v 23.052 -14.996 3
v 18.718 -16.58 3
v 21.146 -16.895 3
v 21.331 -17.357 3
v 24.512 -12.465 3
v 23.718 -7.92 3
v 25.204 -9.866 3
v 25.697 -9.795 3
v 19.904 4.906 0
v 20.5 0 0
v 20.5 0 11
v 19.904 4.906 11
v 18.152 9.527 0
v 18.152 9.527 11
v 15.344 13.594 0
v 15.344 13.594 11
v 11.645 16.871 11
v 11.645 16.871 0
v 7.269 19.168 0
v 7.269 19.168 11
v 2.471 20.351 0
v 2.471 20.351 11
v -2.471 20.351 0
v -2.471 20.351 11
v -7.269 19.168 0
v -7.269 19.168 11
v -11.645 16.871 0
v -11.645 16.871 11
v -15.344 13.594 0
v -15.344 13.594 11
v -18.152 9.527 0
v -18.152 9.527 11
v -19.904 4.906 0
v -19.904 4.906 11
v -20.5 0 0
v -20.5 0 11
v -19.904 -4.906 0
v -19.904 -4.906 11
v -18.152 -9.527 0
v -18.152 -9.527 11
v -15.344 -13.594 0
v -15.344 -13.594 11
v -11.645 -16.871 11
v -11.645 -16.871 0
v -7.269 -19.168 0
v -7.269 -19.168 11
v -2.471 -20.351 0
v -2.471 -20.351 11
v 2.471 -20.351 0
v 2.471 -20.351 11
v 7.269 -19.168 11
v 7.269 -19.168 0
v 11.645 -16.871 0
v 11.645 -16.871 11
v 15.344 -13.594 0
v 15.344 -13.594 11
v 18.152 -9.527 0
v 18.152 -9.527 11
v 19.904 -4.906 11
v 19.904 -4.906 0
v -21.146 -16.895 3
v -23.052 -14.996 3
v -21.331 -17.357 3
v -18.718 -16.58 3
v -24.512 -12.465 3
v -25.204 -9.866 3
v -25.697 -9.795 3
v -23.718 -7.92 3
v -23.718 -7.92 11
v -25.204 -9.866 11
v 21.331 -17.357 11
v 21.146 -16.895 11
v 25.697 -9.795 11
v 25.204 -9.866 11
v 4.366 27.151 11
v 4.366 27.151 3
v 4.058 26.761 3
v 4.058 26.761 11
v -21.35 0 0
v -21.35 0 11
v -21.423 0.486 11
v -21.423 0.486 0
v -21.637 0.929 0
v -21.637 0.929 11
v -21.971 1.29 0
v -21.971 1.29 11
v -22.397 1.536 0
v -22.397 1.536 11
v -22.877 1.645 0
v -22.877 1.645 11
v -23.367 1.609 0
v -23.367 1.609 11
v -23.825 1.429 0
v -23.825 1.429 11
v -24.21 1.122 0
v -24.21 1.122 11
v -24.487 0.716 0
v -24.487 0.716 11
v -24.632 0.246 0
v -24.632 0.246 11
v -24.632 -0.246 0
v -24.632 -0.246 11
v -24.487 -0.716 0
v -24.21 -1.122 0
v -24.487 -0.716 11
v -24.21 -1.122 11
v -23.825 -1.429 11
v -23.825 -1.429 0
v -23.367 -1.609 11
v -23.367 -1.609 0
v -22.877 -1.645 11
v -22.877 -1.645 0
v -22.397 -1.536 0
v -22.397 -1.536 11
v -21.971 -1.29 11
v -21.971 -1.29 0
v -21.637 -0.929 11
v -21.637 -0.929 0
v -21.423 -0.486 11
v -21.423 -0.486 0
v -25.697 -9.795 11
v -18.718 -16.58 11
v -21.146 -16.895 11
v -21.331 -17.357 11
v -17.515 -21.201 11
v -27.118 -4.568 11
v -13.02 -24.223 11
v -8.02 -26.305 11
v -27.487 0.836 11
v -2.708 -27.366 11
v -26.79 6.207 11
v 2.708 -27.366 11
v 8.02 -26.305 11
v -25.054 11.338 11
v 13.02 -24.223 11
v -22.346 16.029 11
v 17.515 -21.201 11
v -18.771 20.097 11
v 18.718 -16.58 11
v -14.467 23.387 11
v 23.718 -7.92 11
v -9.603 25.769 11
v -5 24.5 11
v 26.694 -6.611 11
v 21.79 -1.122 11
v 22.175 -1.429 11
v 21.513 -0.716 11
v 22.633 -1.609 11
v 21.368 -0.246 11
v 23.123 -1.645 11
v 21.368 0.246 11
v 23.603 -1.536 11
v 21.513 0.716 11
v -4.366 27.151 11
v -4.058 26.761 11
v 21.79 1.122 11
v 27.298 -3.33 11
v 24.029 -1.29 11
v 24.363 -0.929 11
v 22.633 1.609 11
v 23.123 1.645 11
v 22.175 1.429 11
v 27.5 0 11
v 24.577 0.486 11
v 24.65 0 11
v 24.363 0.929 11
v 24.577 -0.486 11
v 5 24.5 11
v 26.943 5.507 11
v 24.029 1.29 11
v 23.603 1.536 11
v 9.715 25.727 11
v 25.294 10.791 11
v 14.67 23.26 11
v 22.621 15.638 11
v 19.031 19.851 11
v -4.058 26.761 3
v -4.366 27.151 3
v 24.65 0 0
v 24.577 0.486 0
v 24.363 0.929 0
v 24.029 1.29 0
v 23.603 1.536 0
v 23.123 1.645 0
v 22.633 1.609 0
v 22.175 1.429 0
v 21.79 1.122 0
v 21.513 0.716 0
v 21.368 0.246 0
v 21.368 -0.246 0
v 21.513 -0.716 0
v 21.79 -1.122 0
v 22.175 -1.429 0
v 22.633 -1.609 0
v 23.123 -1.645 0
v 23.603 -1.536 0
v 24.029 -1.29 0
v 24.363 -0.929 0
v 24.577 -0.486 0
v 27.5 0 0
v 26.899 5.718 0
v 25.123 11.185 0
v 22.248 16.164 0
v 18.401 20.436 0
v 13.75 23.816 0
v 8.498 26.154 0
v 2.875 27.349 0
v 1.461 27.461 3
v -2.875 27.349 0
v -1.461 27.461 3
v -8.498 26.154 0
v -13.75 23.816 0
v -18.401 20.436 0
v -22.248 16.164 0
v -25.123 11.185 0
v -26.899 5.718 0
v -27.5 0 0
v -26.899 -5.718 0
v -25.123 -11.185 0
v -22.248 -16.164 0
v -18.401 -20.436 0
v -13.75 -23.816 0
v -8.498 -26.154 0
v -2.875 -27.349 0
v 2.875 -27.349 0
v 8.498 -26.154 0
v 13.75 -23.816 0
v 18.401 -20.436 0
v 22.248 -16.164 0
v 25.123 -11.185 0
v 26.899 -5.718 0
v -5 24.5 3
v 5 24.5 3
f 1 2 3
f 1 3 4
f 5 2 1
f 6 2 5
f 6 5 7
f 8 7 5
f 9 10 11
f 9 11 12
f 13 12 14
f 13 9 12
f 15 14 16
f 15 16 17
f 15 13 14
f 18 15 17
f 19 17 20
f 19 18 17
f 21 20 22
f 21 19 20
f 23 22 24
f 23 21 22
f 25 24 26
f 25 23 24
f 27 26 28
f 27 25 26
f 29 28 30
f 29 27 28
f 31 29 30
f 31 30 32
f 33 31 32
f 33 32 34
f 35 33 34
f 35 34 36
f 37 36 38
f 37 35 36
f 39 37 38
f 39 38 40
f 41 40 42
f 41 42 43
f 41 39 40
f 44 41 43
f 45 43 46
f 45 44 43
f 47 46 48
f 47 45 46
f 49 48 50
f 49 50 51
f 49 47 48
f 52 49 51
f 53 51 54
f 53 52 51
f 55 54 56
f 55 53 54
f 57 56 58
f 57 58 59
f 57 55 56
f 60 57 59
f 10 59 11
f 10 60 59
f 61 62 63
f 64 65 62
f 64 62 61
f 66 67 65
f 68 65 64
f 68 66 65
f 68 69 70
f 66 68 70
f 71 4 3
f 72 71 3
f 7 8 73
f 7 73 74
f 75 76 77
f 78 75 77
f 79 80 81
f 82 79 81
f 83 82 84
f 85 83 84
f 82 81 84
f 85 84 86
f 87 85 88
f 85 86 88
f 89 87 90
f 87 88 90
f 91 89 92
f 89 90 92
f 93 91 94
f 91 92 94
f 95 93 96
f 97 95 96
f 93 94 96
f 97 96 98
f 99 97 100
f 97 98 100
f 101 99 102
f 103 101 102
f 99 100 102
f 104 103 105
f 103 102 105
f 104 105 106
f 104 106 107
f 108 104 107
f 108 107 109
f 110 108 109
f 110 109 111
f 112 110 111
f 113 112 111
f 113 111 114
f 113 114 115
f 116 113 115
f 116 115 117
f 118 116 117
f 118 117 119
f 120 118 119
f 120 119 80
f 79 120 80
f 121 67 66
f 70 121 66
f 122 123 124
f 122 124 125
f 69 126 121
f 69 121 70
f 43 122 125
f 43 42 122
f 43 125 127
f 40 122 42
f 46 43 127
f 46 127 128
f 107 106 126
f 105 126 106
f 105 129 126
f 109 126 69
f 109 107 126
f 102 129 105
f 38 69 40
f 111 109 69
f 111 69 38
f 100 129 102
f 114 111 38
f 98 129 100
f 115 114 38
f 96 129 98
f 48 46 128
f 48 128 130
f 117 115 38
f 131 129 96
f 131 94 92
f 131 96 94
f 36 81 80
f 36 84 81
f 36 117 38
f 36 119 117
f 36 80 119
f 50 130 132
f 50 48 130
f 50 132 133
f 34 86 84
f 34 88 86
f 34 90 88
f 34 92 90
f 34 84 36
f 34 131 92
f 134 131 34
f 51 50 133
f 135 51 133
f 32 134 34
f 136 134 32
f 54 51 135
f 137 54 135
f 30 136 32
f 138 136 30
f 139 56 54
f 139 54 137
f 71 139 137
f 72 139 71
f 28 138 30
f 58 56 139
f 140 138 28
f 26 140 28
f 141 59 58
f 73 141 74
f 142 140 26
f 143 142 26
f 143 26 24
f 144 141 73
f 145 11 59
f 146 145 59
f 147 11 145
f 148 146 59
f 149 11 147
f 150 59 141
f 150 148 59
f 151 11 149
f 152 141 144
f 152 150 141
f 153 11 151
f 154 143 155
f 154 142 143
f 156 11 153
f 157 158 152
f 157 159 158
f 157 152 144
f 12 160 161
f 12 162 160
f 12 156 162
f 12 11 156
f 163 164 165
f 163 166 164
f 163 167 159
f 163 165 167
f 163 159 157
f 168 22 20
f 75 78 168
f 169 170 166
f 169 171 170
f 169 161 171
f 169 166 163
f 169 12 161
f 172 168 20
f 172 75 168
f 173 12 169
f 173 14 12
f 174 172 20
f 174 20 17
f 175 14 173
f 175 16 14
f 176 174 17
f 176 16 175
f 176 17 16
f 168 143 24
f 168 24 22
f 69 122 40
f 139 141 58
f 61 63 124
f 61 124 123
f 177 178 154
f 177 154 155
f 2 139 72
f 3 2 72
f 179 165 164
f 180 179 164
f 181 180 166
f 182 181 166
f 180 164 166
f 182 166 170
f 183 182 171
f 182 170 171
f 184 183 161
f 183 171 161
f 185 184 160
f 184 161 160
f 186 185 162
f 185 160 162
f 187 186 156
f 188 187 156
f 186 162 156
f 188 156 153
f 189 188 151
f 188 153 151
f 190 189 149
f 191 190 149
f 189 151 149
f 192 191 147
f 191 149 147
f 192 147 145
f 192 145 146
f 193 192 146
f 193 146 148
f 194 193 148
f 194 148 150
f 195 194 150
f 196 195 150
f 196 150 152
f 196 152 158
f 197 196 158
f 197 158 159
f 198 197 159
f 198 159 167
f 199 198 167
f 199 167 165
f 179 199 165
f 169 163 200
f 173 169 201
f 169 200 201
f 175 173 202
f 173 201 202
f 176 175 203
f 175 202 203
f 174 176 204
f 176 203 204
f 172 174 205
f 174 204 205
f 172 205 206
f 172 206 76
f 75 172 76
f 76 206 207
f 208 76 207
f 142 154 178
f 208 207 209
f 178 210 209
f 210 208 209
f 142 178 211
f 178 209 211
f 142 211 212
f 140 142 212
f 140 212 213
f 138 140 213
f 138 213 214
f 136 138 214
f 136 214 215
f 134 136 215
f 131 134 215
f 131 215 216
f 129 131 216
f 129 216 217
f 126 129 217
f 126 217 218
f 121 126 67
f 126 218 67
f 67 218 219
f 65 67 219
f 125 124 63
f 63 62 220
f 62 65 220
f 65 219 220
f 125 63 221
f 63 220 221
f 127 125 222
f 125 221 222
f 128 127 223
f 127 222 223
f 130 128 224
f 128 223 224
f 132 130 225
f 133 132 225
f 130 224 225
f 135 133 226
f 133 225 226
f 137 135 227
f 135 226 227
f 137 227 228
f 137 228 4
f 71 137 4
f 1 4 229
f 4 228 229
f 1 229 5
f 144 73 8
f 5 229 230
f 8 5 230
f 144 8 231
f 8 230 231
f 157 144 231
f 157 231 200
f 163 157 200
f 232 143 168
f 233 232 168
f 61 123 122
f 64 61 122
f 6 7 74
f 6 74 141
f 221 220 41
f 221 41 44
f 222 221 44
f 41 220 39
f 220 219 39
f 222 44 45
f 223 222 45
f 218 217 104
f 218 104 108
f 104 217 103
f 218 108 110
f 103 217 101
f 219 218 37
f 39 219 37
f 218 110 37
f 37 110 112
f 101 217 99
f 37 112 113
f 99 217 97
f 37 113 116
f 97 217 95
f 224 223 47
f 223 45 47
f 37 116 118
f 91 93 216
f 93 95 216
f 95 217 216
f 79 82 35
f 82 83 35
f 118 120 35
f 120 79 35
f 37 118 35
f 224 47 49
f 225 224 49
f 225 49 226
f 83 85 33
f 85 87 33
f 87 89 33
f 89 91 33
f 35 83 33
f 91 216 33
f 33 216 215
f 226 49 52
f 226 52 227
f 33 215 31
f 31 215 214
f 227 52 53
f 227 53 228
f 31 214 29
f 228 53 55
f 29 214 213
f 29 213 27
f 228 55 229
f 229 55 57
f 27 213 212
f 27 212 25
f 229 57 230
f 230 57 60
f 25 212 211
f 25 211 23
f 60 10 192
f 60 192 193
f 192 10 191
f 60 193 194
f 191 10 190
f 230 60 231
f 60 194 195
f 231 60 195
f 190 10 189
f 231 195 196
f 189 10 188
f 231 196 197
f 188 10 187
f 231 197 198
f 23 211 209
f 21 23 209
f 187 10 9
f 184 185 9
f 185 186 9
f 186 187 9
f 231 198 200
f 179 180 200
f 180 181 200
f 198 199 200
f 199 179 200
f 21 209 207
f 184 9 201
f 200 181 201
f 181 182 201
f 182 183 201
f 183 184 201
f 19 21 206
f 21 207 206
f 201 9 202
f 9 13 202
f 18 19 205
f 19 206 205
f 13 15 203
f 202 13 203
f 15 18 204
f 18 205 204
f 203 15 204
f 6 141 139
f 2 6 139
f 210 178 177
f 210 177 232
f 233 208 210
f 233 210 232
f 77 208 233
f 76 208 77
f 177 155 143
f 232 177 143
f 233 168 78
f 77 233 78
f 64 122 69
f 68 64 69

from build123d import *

# Parameters (mm, degrees)
F0_R        = 27.5
F0_R_2      = 20.5
F1_DEPTH    = 11
F2_R        = 1.65
F3_DEPTH    = 11.001
F5_DEPTH    = 8
F6_T1_DEPTH = 9.2955577349


# Not quite as in the source:
# - a fillet or chamfer that OpenCascade refuses, or shapes differently, is made with other operations: its cross-section is extruded or revolved along the edge and cut away or added


with BuildPart() as f1:
    # F0 (on Top) → F1 (new body)
    with BuildSketch(Plane.XY):
        Circle(F0_R)
        Circle(F0_R_2, mode=Mode.SUBTRACT)
    extrude(amount=F1_DEPTH)

    # F2 (on face) → F3 (cut, through all)
    with BuildSketch(Plane.XY.offset(11)):
        with Locations((-23, 0)):
            Circle(F2_R)
        with Locations((23, 0)):
            Circle(F2_R)
    extrude(amount=-F3_DEPTH, mode=Mode.SUBTRACT)

    # F4 (on face) → F5 (cut)
    with BuildSketch(Plane.XY.offset(11)):
        Polygon((2.5, 30.5), (-2.5, 30.5), (-5, 24.5), (5, 24.5), align=None)
        Polygon((-27.6637748154, -13.0849364905), (-25.1637748154, -17.4150635095), (-18.7176223927, -16.5801270189), (-23.7176223927, -7.9198729811), align=None)
        Polygon((25.1637748154, -17.4150635095), (27.6637748154, -13.0849364905), (23.7176223927, -7.9198729811), (18.7176223927, -16.5801270189), align=None)
    extrude(amount=-F5_DEPTH, mode=Mode.SUBTRACT)

    # F6: chamfer of 0.5 on 6 edges, made by hand

    # F6_s2 → F6_t1 (cut)
    with BuildSketch(Plane.XY.offset(3)):
        with BuildLine():
            Line((4.3783542155, 27.1669165233), (4.0456541802, 26.7450037593))
            Line((4.0456541802, 26.7450037593), (4.0364234109, 26.7411576055))
            ThreePointArc((4.0364234109, 26.7411576055), (3.953486728, 26.9856318529), (3.8544223971, 27.223386247))
            Line((3.8544223971, 27.223386247), (3.8650581311, 27.2371332126))
            ThreePointArc((3.8650581311, 27.2371332126), (4.1213755716, 27.1995287348), (4.3799418411, 27.1767896913))
            Line((4.3799418411, 27.1767896913), (4.3783542155, 27.1669165233))
        make_face()
        with BuildLine():
            Line((-4.3783542155, 27.1669165233), (-4.0456541802, 26.7450037593))
            Line((-4.0456541802, 26.7450037593), (-4.0364234109, 26.7411576055))
            ThreePointArc((-4.0364234109, 26.7411576055), (-3.953486728, 26.9856318529), (-3.8544223971, 27.223386247))
            Line((-3.8544223971, 27.223386247), (-3.8650581311, 27.2371332126))
            ThreePointArc((-3.8650581311, 27.2371332126), (-4.1213755716, 27.1995287348), (-4.3799418411, 27.1767896913))
            Line((-4.3799418411, 27.1767896913), (-4.3783542155, 27.1669165233))
        make_face()
        with BuildLine():
            Line((25.7164169594, -9.7916922843), (25.18467977, -9.8688625847))
            Line((25.18467977, -9.8688625847), (25.1767335184, -9.8749335884))
            ThreePointArc((25.1767335184, -9.8749335884), (25.3469860858, -10.0689959865), (25.5033552655, -10.2736654107))
            Line((25.5033552655, -10.2736654107), (25.520578354, -10.2713280777))
            ThreePointArc((25.520578354, -10.2713280777), (25.6161706411, -10.0305484239), (25.7257611865, -9.7952539442))
            Line((25.7257611865, -9.7952539442), (25.7164169594, -9.7916922843))
        make_face()
        with BuildLine():
            Line((21.3380627439, -17.3752242391), (21.1390255898, -16.8761411746))
            Line((21.1390255898, -16.8761411746), (21.1403101075, -16.866224017))
            ThreePointArc((21.1403101075, -16.866224017), (21.3934993578, -16.9166358664), (21.6489328684, -16.9497208363))
            Line((21.6489328684, -16.9497208363), (21.6555202229, -16.965805135))
            ThreePointArc((21.6555202229, -16.965805135), (21.4947950695, -17.168980311), (21.3458193454, -17.3815357471))
            Line((21.3458193454, -17.3815357471), (21.3380627439, -17.3752242391))
        make_face()
        with BuildLine():
            Line((-25.7164169594, -9.7916922843), (-25.18467977, -9.8688625847))
            Line((-25.18467977, -9.8688625847), (-25.1767335184, -9.8749335884))
            ThreePointArc((-25.1767335184, -9.8749335884), (-25.3469860858, -10.0689959865), (-25.5033552655, -10.2736654107))
            Line((-25.5033552655, -10.2736654107), (-25.520578354, -10.2713280777))
            ThreePointArc((-25.520578354, -10.2713280777), (-25.6161706411, -10.0305484239), (-25.7257611865, -9.7952539442))
            Line((-25.7257611865, -9.7952539442), (-25.7164169594, -9.7916922843))
        make_face()
        with BuildLine():
            Line((-21.3380627439, -17.3752242391), (-21.1390255898, -16.8761411746))
            Line((-21.1390255898, -16.8761411746), (-21.1403101075, -16.866224017))
            ThreePointArc((-21.1403101075, -16.866224017), (-21.3934993578, -16.9166358664), (-21.6489328684, -16.9497208363))
            Line((-21.6489328684, -16.9497208363), (-21.6555202229, -16.965805135))
            ThreePointArc((-21.6555202229, -16.965805135), (-21.4947950695, -17.168980311), (-21.3458193454, -17.3815357471))
            Line((-21.3458193454, -17.3815357471), (-21.3380627439, -17.3752242391))
        make_face()
    extrude(amount=F6_T1_DEPTH, mode=Mode.SUBTRACT)


solid = f1.part
